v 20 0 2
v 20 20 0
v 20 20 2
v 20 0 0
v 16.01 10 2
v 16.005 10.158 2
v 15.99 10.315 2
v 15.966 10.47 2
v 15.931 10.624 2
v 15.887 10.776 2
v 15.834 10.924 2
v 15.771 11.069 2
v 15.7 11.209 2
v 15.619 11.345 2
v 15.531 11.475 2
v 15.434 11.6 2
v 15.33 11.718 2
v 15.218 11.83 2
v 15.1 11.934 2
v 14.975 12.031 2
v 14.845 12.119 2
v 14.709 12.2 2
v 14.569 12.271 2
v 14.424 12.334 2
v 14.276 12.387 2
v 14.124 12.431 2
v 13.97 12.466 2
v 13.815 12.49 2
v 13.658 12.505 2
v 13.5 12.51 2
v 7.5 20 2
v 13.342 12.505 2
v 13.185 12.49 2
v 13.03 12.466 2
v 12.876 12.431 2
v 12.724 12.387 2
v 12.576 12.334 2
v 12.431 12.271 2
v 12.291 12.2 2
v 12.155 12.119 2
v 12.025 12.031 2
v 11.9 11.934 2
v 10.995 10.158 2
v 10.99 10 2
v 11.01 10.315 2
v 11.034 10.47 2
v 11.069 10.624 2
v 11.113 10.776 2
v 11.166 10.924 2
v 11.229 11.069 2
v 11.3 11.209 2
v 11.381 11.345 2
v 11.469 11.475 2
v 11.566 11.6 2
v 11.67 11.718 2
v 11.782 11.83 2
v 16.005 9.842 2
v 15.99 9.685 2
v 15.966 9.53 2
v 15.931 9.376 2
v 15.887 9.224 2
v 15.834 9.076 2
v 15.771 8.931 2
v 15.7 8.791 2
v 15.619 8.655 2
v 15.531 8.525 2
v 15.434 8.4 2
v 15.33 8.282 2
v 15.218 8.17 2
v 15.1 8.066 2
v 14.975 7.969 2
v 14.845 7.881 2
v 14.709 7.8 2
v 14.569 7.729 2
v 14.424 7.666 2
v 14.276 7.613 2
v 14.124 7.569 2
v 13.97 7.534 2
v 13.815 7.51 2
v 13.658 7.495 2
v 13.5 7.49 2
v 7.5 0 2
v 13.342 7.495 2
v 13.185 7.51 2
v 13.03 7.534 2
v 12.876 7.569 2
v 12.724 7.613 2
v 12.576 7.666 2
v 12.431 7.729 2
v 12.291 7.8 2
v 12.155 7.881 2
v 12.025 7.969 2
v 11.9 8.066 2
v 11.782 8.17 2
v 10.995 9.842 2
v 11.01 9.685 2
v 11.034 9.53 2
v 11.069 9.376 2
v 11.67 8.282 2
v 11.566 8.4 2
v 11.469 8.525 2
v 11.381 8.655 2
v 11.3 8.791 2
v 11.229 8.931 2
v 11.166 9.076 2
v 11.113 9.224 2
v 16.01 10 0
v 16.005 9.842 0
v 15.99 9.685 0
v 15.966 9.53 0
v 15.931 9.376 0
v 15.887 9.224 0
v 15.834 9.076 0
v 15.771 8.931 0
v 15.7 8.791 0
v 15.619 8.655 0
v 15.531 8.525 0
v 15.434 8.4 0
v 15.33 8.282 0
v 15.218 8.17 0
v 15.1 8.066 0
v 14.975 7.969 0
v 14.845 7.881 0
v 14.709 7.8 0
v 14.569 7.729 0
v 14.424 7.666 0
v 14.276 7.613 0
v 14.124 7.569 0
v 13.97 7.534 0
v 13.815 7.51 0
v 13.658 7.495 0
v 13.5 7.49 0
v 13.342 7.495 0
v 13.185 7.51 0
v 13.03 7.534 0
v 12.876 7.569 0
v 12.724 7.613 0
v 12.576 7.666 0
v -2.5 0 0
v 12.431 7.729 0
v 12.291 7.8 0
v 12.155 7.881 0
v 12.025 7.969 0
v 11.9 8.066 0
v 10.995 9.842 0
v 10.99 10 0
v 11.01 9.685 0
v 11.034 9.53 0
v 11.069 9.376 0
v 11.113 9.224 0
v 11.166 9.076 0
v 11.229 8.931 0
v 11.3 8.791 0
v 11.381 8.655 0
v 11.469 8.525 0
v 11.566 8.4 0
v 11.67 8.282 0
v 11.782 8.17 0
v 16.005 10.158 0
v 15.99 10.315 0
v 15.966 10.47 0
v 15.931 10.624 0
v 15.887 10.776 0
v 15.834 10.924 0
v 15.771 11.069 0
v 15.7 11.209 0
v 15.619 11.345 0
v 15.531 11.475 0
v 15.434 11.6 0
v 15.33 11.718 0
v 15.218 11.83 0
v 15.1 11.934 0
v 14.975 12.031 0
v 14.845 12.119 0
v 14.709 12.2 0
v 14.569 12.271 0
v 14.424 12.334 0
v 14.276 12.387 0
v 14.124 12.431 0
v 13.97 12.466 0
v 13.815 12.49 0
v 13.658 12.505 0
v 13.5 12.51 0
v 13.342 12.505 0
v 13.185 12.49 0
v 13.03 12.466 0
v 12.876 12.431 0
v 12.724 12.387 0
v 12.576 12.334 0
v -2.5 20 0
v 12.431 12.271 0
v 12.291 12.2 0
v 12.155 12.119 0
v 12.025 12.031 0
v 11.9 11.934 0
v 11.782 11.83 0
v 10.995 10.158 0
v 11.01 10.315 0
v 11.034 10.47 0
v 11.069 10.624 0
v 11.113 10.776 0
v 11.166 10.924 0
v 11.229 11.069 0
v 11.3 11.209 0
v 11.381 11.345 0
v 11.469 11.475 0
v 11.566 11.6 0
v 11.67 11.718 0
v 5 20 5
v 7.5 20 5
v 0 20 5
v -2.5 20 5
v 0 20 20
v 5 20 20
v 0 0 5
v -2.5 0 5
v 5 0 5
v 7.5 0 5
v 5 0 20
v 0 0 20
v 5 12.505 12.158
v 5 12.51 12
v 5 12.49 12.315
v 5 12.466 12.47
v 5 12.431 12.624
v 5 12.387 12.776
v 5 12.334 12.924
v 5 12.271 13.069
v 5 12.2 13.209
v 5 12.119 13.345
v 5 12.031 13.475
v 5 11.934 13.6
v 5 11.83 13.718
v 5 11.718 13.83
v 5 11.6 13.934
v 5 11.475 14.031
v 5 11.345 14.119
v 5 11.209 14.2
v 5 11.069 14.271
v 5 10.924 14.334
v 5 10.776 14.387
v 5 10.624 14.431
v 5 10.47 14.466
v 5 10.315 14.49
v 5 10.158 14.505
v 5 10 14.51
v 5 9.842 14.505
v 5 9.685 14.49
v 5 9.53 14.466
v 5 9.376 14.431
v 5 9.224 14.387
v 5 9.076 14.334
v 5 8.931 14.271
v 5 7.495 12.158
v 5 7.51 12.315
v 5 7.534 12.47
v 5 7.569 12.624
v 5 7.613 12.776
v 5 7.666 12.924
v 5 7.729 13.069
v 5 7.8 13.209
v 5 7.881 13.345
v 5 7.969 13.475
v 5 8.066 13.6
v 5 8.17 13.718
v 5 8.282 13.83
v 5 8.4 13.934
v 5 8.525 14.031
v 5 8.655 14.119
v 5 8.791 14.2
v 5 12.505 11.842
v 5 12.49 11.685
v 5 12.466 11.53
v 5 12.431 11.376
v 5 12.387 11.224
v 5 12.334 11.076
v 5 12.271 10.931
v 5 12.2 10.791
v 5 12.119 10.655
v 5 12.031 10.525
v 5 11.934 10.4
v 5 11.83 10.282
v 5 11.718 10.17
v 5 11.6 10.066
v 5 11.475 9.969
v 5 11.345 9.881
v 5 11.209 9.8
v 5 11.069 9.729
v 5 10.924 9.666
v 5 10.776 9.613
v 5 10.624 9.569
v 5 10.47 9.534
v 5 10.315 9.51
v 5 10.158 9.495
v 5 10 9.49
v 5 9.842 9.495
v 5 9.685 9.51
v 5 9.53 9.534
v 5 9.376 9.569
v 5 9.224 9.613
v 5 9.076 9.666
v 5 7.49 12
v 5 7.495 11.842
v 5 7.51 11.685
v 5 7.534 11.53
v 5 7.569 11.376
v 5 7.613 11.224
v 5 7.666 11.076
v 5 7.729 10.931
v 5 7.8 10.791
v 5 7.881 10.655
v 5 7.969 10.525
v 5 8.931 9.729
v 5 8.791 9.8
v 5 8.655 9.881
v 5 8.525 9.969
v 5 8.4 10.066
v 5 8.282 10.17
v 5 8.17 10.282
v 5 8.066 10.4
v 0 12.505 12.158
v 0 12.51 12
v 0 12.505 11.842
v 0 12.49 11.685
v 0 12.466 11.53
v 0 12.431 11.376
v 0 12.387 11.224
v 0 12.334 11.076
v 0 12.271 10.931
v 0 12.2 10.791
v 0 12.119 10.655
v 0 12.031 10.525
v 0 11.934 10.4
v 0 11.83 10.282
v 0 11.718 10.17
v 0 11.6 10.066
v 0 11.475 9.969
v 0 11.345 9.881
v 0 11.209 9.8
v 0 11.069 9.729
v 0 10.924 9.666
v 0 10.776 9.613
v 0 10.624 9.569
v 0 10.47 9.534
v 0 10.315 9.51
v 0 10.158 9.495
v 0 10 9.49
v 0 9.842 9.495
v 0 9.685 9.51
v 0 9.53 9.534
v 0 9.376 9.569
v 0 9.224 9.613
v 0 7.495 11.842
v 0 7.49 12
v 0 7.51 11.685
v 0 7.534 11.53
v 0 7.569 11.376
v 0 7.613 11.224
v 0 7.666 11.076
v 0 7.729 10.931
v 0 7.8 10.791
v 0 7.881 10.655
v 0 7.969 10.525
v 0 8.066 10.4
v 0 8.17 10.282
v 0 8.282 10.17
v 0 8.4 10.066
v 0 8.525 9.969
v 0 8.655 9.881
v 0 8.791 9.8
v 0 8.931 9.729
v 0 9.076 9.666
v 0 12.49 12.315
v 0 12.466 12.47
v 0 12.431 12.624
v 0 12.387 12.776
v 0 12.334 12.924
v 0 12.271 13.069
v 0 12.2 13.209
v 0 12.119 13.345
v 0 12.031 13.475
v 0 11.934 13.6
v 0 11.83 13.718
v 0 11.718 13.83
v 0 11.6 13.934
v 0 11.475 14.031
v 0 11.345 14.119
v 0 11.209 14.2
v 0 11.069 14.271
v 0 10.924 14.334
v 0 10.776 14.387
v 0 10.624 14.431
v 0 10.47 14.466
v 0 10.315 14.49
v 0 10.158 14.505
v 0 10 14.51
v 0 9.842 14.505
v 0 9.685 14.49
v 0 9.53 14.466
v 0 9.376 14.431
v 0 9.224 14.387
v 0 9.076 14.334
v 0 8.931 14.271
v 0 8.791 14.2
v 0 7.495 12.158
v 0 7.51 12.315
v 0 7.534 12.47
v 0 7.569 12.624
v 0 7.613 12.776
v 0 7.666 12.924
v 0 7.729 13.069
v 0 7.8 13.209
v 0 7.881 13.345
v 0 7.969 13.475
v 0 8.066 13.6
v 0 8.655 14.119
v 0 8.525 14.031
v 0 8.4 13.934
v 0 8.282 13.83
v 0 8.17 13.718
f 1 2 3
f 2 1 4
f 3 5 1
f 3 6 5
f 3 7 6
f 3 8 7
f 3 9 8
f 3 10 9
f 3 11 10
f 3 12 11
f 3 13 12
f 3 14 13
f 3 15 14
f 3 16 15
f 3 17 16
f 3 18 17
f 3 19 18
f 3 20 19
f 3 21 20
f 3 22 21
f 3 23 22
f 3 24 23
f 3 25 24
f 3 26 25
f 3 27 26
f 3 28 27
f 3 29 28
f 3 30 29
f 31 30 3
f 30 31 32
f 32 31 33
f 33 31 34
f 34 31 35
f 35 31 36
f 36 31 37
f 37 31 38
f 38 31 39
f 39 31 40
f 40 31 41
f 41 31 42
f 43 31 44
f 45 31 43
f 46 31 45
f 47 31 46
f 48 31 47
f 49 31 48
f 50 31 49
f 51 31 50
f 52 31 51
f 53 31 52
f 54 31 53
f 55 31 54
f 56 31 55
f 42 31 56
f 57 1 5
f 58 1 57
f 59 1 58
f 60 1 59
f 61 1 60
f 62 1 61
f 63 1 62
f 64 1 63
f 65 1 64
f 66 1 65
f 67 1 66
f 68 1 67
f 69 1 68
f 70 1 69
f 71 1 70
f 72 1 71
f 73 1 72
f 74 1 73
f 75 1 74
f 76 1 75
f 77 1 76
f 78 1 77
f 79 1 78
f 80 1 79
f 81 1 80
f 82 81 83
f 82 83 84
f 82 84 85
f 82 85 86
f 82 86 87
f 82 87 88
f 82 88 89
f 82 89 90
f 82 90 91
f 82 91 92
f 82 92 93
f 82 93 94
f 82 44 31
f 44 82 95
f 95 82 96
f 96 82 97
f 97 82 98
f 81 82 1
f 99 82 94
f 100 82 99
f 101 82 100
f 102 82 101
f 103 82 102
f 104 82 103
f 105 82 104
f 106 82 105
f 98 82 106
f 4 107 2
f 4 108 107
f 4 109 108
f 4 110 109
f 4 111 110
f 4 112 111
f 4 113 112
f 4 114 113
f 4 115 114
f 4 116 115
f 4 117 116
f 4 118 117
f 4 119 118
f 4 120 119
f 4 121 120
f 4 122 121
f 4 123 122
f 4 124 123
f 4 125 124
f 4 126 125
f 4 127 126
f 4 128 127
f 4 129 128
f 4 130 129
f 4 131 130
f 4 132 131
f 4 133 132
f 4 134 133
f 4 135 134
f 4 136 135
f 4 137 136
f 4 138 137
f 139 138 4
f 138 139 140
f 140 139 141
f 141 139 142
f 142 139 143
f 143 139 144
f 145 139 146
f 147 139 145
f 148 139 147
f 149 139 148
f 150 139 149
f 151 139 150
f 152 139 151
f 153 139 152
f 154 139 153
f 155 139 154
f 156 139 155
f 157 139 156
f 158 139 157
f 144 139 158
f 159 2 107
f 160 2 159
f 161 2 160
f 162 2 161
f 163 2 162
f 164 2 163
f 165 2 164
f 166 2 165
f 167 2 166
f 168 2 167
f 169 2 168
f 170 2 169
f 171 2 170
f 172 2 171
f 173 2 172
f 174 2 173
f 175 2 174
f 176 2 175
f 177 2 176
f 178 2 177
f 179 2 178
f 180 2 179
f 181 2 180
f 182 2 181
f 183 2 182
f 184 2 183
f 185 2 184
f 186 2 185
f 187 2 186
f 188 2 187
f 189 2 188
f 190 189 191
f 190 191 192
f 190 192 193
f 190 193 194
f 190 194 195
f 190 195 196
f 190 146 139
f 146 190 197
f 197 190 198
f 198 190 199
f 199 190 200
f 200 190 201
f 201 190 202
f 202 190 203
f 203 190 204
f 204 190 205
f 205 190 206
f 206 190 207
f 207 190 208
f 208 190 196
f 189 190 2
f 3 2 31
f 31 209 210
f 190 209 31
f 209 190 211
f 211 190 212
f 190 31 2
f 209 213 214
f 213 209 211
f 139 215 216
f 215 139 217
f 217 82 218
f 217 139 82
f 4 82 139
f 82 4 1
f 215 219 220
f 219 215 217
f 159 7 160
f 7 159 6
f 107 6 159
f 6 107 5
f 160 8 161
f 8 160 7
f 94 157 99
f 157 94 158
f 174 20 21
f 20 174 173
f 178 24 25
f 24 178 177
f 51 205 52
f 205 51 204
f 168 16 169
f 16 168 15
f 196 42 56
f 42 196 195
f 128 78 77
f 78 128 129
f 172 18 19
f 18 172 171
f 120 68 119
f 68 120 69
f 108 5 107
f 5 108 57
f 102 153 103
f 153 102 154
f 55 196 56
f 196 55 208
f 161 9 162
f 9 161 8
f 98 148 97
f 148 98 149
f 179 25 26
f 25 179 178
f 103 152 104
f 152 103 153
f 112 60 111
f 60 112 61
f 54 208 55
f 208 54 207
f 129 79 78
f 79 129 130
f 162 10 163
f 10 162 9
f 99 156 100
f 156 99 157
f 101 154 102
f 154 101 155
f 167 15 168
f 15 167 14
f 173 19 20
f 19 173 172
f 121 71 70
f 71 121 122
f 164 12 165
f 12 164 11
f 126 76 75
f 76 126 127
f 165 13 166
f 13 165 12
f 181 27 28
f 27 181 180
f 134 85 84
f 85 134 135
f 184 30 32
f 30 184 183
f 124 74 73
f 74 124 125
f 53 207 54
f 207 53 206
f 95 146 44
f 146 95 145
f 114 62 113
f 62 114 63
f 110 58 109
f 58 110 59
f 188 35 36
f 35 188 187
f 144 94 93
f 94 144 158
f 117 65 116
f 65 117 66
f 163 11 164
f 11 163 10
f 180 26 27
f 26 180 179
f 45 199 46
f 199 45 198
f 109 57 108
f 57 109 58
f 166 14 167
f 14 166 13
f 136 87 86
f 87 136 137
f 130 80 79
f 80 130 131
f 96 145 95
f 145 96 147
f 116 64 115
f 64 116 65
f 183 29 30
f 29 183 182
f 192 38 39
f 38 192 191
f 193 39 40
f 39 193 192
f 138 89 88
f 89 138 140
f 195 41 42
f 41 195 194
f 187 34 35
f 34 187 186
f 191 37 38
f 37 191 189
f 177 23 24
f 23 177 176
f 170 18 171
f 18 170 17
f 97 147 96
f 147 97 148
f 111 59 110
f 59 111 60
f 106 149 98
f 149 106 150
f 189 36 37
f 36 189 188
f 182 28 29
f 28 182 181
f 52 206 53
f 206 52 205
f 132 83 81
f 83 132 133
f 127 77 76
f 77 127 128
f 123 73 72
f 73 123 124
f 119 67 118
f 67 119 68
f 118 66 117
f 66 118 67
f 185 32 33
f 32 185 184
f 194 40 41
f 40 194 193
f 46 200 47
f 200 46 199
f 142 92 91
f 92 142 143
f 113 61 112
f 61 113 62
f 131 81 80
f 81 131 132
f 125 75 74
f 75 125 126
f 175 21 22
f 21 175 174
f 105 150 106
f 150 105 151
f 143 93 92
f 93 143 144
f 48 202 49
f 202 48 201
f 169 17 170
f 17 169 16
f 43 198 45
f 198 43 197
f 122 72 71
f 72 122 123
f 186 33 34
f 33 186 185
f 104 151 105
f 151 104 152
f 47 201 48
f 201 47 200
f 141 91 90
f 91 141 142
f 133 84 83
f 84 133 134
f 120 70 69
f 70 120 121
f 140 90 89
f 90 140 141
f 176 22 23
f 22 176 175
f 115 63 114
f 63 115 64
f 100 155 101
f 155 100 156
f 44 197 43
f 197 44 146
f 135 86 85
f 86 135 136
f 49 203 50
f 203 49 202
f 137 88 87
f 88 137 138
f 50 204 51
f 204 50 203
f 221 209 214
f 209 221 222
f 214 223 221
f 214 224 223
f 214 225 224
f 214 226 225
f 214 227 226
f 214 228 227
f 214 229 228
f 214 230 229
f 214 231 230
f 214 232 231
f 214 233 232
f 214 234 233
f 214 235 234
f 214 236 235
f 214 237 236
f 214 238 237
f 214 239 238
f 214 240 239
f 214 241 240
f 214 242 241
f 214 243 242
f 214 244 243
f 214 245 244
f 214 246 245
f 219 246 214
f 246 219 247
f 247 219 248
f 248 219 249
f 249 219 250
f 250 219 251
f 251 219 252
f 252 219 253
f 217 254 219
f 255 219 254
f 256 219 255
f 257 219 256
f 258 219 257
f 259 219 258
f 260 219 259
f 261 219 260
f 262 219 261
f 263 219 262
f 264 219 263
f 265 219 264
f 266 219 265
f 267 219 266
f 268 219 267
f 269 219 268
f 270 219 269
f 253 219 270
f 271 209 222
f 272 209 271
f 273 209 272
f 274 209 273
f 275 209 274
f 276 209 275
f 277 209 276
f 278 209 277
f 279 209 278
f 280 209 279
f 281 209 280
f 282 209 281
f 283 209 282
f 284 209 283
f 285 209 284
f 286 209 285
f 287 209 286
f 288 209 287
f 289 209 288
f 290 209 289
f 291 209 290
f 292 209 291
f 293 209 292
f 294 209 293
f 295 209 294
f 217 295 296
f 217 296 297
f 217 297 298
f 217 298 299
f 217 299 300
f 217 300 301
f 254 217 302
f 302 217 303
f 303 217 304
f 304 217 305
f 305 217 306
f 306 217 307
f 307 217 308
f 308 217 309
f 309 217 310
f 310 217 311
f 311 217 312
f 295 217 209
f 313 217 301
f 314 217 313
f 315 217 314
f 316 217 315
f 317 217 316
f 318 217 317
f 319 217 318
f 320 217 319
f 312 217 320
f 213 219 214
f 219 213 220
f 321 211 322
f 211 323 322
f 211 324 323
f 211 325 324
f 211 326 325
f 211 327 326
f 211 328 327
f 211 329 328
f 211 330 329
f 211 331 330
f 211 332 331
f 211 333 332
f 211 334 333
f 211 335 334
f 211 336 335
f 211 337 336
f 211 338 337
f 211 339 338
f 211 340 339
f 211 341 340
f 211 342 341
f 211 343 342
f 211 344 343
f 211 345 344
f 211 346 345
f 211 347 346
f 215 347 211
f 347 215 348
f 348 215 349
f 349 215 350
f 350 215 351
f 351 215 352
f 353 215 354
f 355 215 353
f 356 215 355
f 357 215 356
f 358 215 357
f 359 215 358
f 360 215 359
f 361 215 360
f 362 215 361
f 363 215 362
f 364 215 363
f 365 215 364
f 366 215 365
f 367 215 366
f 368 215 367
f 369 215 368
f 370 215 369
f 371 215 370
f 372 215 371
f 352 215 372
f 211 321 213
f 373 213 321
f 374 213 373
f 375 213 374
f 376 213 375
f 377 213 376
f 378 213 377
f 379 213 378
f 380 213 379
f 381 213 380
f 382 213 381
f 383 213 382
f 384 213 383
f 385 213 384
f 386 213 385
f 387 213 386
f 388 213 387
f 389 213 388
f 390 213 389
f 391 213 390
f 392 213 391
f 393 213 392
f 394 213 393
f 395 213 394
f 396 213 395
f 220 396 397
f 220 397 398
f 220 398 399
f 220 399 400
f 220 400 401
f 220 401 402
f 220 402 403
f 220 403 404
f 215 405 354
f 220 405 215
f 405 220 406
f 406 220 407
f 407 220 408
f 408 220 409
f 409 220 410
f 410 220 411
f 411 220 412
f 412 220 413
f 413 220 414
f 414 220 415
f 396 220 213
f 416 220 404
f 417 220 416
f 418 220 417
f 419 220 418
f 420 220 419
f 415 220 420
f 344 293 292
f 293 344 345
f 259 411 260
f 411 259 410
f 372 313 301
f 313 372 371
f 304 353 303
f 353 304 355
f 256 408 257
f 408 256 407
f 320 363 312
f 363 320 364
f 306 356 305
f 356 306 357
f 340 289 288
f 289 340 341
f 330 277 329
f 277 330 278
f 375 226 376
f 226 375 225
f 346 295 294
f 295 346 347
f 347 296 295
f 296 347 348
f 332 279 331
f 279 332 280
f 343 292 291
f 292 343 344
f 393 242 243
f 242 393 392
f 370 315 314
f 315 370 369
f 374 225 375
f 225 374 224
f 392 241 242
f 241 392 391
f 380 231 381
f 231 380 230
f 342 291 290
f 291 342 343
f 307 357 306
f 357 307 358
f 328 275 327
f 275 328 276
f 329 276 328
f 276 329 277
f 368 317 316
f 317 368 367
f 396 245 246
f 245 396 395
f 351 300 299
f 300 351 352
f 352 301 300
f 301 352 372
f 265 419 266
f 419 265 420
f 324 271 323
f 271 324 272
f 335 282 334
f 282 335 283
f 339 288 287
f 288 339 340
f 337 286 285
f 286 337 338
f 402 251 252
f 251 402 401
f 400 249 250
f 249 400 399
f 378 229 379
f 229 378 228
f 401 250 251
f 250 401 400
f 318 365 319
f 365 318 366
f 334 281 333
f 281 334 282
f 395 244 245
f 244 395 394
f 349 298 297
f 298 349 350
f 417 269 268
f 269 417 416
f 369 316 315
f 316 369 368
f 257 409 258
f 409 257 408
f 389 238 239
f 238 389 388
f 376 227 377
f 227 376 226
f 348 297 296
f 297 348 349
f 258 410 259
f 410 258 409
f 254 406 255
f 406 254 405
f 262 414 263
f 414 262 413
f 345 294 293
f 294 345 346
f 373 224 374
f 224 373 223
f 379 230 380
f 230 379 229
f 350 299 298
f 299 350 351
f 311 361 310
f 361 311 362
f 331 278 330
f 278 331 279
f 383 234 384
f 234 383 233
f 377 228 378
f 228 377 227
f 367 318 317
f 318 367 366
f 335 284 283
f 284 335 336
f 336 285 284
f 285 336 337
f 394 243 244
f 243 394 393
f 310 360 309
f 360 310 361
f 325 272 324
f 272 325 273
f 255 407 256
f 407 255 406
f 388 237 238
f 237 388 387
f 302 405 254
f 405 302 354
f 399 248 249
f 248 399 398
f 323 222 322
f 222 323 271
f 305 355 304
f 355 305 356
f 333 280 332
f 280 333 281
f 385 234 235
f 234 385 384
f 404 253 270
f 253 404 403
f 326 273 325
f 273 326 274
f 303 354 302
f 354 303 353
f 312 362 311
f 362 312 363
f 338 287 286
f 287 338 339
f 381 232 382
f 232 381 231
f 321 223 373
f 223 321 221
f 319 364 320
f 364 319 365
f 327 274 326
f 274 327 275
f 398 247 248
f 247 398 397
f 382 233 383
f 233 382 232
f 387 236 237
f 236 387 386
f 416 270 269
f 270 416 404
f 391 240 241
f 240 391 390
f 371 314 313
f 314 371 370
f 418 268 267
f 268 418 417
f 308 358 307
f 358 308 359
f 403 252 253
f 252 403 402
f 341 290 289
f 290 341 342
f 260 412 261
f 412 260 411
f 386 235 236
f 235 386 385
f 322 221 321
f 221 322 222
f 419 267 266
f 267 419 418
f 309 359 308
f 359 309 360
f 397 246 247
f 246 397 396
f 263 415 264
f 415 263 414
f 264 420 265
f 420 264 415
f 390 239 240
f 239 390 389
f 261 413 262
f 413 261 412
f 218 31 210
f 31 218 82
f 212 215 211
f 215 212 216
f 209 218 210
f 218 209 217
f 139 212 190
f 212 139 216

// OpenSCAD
$fn = 100;
difference() {
cube([20, 20, 2]);
translate([13.5, 10, -1]) {
    cylinder(10, 2.51, 2.51);
}
}
difference() {
cube([5, 20, 20]);
    translate([-1, 10, 12]) {
    rotate([0, 90, 0]) {
    cylinder(10, 2.51, 2.51);
    }
}
}


translate([-2.5, 0, 0]) {
    cube([10, 20, 5]);
}

/*difference() {
translate([40, 0, 0]) {
    cylinder(140, 5, 5);
}
translate([40, 0, 0]) {
    cylinder(160, 2.5, 2.5);
}
}
*/
